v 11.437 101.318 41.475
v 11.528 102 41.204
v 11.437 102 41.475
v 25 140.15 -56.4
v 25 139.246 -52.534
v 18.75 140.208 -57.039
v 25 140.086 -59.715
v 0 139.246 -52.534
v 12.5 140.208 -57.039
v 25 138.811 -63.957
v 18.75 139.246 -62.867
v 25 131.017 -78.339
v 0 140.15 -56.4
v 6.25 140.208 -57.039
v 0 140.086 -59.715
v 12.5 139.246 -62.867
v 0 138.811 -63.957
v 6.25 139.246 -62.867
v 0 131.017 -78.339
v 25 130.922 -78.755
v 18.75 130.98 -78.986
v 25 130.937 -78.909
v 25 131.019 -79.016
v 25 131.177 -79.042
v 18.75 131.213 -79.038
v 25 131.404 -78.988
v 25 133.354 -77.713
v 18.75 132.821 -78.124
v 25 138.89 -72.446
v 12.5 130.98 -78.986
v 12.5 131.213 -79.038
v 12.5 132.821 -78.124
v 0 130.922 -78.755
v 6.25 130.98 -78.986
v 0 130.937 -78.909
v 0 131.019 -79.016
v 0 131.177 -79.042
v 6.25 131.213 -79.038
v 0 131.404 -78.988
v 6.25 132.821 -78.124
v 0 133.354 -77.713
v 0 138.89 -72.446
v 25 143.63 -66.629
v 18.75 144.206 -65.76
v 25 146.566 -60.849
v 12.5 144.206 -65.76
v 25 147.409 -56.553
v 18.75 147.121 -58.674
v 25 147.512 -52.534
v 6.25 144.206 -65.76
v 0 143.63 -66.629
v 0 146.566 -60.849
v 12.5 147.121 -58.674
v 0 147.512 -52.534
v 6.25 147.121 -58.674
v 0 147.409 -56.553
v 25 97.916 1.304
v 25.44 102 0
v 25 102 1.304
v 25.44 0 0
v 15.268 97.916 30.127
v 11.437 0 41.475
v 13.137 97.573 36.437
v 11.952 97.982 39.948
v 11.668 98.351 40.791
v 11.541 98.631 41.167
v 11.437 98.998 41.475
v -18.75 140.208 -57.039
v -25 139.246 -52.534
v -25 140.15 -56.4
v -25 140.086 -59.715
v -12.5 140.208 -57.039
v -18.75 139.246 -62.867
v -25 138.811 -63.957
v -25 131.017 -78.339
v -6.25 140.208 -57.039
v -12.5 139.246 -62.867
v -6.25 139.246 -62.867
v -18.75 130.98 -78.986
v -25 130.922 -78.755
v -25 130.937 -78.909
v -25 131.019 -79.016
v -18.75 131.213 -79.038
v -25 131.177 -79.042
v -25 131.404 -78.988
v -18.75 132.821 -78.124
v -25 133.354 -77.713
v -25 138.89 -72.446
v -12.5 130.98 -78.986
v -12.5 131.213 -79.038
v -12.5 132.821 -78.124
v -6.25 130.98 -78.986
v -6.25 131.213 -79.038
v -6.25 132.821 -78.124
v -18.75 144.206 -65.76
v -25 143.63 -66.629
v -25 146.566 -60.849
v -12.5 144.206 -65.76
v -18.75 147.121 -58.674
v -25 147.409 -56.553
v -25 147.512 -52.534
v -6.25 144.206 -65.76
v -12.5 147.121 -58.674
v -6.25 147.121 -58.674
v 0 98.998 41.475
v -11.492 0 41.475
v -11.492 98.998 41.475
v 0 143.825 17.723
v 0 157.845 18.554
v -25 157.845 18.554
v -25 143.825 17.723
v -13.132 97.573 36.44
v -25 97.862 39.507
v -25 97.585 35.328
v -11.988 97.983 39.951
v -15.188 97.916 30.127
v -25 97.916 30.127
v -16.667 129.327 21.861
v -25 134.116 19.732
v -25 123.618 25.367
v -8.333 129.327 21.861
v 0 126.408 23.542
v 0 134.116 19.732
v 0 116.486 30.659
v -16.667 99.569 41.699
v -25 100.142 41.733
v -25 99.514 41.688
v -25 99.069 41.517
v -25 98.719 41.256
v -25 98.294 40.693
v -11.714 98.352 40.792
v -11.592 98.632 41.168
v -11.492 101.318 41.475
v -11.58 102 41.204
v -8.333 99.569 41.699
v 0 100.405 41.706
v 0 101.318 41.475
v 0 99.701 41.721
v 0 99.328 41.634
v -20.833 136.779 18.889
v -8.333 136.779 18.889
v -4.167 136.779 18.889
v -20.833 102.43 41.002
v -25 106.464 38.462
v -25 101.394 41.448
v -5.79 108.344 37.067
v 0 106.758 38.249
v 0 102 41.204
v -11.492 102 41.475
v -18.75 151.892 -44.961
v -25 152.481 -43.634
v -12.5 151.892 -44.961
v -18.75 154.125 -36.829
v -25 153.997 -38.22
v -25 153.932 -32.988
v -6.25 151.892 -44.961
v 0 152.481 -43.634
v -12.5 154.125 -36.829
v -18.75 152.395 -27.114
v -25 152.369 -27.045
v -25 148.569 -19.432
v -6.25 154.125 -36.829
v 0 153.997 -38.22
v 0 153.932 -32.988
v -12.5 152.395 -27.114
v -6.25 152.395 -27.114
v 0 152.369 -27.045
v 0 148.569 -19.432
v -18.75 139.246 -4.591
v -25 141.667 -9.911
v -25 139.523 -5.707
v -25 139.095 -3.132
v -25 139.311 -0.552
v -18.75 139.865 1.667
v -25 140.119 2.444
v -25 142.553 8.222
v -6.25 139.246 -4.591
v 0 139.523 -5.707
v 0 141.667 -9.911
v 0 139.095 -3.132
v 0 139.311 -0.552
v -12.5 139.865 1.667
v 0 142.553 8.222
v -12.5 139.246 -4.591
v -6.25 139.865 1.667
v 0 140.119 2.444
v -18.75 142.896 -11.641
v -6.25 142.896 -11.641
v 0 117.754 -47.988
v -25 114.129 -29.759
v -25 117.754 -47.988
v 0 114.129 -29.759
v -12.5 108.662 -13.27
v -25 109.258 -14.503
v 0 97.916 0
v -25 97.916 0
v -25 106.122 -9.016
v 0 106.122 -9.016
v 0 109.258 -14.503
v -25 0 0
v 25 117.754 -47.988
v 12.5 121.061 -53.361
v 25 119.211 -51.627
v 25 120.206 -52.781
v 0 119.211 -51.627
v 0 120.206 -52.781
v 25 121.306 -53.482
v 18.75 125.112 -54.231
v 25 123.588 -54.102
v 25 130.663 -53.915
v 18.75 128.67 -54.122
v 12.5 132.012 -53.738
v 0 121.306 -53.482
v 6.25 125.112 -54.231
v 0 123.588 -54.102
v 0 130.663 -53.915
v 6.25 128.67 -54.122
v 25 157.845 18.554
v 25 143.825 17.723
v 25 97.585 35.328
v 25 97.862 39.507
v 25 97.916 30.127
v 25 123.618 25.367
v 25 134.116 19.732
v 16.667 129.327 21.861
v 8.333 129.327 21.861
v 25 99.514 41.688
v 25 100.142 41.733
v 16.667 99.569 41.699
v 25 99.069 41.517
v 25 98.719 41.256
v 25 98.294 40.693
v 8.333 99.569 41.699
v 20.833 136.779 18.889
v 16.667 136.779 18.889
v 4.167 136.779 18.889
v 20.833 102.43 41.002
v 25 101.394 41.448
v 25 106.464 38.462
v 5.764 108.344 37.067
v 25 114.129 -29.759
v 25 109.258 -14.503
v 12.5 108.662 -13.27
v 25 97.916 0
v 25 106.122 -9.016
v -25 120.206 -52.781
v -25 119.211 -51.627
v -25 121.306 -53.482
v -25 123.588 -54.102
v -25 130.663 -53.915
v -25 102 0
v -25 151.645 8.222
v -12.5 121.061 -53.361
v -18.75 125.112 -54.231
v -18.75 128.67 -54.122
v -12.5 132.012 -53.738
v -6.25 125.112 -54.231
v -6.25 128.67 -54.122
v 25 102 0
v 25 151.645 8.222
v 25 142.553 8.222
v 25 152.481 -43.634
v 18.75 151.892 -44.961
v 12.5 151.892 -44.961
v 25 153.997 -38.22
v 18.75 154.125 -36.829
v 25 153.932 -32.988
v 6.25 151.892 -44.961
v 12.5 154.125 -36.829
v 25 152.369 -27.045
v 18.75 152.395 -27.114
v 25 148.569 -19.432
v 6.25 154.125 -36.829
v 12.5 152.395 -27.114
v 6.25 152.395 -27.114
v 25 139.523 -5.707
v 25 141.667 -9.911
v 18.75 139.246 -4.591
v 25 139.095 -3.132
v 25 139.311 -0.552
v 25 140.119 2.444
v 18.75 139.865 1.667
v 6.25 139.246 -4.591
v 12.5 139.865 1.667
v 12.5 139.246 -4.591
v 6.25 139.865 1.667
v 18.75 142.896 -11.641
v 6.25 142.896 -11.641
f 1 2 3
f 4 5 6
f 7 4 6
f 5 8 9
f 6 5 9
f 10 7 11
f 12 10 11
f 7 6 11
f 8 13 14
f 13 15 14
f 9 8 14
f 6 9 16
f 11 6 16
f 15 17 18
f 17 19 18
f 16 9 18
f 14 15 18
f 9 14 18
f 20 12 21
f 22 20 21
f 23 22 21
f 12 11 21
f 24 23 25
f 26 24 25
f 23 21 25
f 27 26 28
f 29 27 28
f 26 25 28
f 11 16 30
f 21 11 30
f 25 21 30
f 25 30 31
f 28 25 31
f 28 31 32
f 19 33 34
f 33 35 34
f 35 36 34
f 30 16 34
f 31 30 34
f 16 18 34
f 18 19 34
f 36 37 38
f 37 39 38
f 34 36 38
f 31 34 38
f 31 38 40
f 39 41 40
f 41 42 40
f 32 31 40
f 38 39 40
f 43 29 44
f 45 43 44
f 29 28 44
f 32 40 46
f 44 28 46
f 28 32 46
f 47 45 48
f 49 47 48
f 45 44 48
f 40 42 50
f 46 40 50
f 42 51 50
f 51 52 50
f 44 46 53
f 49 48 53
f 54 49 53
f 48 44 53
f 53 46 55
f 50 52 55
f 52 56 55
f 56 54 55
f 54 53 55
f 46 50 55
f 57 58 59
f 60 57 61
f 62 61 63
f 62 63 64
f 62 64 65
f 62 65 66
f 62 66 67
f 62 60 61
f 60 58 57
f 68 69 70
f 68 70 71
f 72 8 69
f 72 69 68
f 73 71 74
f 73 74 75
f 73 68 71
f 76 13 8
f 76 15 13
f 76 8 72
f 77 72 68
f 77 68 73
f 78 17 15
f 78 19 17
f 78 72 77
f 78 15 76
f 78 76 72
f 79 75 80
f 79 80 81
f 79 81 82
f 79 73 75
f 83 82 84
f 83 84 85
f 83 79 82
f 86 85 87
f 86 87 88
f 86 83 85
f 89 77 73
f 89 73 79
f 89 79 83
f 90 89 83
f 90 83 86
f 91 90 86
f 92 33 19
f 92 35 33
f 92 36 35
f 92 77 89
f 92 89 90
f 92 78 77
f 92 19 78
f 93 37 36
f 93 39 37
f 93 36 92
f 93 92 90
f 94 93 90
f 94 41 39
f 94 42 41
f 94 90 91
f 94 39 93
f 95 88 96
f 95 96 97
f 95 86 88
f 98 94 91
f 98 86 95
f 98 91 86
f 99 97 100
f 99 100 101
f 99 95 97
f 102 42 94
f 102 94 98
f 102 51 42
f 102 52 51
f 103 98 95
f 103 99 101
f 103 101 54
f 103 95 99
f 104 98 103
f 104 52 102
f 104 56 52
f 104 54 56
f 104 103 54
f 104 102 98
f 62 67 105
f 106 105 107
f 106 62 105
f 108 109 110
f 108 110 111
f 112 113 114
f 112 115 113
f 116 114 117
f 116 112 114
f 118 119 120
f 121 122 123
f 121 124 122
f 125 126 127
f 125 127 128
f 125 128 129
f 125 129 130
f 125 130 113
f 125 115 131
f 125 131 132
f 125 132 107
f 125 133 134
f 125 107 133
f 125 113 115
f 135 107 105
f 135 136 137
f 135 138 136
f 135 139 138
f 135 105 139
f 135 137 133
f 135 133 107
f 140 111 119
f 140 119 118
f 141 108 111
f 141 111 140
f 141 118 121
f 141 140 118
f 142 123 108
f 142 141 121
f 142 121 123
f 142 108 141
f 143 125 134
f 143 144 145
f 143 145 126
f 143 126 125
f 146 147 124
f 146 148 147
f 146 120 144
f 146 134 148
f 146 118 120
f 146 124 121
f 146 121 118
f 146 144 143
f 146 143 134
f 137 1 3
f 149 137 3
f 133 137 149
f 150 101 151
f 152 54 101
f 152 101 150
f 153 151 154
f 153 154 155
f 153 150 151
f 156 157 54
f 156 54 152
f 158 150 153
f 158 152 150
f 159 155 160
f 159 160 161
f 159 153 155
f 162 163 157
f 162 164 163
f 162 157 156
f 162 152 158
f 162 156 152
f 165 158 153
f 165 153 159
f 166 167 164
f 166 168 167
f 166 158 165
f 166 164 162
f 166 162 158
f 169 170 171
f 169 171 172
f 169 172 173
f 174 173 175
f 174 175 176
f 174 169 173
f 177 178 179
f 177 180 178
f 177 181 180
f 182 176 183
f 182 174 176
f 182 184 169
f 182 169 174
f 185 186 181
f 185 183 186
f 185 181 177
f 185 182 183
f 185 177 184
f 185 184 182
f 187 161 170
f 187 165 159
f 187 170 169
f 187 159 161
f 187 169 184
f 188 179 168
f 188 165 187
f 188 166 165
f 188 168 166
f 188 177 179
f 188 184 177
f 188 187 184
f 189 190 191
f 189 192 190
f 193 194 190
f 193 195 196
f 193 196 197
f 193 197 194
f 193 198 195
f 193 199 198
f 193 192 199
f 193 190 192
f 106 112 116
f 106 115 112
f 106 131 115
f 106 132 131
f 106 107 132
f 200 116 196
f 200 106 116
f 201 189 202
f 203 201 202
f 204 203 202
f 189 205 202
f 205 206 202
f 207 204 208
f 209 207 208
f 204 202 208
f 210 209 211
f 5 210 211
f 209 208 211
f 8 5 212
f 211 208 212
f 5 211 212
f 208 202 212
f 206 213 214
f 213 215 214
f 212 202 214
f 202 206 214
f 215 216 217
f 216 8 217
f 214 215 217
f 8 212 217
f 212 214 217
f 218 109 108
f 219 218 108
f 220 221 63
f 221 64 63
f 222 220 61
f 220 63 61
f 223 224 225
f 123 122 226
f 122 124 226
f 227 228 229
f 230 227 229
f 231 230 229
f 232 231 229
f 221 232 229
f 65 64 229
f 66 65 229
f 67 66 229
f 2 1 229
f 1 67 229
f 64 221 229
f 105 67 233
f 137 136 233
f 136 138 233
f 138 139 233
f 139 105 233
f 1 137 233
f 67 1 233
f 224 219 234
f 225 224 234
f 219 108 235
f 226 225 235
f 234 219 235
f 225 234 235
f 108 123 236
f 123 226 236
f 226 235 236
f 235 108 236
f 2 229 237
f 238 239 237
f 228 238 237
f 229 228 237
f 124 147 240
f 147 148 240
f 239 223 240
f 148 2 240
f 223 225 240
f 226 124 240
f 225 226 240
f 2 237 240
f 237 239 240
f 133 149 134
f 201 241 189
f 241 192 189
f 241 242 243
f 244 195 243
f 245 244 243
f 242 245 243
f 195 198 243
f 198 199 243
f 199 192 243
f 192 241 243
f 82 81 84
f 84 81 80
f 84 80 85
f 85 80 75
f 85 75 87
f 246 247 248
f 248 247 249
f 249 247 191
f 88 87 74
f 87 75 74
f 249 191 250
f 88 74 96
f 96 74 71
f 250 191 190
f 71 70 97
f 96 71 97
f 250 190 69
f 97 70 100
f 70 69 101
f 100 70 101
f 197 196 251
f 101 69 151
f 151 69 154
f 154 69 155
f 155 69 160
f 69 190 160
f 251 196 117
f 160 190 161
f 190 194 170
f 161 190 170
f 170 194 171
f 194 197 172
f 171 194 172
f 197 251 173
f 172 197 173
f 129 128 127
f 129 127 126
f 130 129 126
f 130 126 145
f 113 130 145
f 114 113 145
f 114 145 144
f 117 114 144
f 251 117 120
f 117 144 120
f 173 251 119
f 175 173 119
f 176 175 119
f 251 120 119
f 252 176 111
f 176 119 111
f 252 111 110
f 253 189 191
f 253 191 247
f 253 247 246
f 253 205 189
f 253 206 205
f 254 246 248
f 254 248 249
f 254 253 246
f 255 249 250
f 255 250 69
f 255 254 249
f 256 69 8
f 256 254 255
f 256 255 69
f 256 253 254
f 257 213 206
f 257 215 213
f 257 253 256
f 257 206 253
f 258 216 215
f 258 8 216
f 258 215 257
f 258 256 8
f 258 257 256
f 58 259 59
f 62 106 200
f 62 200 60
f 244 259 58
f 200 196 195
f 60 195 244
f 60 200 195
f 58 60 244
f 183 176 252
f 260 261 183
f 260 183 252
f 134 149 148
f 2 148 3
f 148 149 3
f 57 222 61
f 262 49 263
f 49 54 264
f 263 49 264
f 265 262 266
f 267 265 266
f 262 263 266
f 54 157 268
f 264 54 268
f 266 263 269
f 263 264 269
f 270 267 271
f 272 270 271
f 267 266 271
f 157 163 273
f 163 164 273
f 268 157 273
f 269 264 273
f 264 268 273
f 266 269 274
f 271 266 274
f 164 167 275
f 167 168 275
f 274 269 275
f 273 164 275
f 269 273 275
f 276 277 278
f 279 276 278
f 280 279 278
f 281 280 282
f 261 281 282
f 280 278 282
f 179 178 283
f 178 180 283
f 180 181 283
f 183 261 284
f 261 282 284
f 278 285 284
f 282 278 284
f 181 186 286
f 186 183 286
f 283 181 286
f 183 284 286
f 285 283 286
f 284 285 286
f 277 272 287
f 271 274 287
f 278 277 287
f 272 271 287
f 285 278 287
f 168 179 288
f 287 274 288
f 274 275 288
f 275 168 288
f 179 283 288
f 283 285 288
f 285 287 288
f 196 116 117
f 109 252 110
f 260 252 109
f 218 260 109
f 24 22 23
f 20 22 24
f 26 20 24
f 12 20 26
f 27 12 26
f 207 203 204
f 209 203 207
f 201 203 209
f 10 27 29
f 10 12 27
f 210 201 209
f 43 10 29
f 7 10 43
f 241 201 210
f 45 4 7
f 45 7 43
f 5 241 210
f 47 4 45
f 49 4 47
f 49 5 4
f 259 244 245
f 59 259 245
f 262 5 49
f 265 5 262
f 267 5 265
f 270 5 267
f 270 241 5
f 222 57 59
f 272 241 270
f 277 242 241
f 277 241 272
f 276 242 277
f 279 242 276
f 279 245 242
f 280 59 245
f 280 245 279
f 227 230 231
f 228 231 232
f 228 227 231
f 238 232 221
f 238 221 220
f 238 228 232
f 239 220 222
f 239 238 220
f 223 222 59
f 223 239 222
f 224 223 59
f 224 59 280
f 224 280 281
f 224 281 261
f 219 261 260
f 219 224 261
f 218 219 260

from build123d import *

# Parameters (mm, degrees)
F1_DEPTH      = 25
F1_DEPTH_BACK = 25
F3_DEPTH      = 102


with BuildPart() as f1:
    # F0 (on Right) → F1 (new body, two sides)
    with BuildSketch(Plane.YZ) as f1_sk:
        with BuildLine():
            Line((97.9158058763, 30.1268287003), (97.9158058763, 0))
            add(Edge.make_bspline(
                [(97.9158058763, 0), (101.8021663079, -3.696980686), (111.322754248, -12.7536367407), (115.3632833237, -34.8885167563), (117.7544444799, -47.9878075421)],
                knots=[0, 0, 0, 0, 0.4082059276, 1, 1, 1, 1], degree=3))
            add(Edge.make_bspline(
                [(117.7544444799, -47.9878075421), (118.3996283157, -50.1406766369), (120.140772316, -55.9505790246), (131.8659232896, -53.853910931), (139.2462998629, -52.5341667235)],
                knots=[0, 0, 0, 0, 0.3705516808, 1, 1, 1, 1], degree=3))
            add(Edge.make_bspline(
                [(139.2462998629, -52.5341667235), (140.1012876765, -55.3905852567), (142.0883412882, -62.0291088385), (123.351206173, -87.5491233148), (147.5744893106, -65.1804071235), (147.5319825692, -56.5218574441), (147.5124061108, -52.5341667235)],
                knots=[0, 0, 0, 0, 0.2075483266, 0.4823573452, 0.7615999345, 1, 1, 1, 1], degree=3))
            add(Edge.make_bspline(
                [(147.5124061108, -52.5341667235), (150.6703452653, -47.5471900273), (157.2604657803, -37.1401568881), (148.7008340103, -17.2326111997), (136.3144713941, -5.3646602758), (140.5310533356, 3.8186216049), (142.5527483225, 8.2216653973)],
                knots=[0, 0, 0, 0, 0.2547960421, 0.5317191187, 0.7754766483, 1, 1, 1, 1], degree=3))
            Line((142.5527483225, 8.2216653973), (151.6454517841, 8.2216653973))
            Line((151.6454517841, 8.2216653973), (157.8450202942, 18.5542888939))
            add(Edge.make_bspline(
                [(157.8450202942, 18.5542888939), (148.8377384911, 17.4304544494), (129.7771030879, 15.0522676591), (96.2484454593, 50.8784565164), (97.4710717705, 35.6618987099), (97.9158058763, 30.1268287003)],
                knots=[0, 0, 0, 0, 0.3630752259, 0.7683166416, 1, 1, 1, 1], degree=3))
        make_face()
    extrude(amount=F1_DEPTH)
    extrude(f1_sk.sketch, amount=-F1_DEPTH_BACK)

    # F2 (on Front) → F3 (join)
    with BuildSketch(Plane.XZ):
        Polygon((-11.4919018, 41.4746329188), (-25, 0), (0, 0), (25.4404135048, 0), (11.436519213, 41.4746329188), (0, 41.4746329188), align=None)
    extrude(amount=-F3_DEPTH)


solid = f1.part
